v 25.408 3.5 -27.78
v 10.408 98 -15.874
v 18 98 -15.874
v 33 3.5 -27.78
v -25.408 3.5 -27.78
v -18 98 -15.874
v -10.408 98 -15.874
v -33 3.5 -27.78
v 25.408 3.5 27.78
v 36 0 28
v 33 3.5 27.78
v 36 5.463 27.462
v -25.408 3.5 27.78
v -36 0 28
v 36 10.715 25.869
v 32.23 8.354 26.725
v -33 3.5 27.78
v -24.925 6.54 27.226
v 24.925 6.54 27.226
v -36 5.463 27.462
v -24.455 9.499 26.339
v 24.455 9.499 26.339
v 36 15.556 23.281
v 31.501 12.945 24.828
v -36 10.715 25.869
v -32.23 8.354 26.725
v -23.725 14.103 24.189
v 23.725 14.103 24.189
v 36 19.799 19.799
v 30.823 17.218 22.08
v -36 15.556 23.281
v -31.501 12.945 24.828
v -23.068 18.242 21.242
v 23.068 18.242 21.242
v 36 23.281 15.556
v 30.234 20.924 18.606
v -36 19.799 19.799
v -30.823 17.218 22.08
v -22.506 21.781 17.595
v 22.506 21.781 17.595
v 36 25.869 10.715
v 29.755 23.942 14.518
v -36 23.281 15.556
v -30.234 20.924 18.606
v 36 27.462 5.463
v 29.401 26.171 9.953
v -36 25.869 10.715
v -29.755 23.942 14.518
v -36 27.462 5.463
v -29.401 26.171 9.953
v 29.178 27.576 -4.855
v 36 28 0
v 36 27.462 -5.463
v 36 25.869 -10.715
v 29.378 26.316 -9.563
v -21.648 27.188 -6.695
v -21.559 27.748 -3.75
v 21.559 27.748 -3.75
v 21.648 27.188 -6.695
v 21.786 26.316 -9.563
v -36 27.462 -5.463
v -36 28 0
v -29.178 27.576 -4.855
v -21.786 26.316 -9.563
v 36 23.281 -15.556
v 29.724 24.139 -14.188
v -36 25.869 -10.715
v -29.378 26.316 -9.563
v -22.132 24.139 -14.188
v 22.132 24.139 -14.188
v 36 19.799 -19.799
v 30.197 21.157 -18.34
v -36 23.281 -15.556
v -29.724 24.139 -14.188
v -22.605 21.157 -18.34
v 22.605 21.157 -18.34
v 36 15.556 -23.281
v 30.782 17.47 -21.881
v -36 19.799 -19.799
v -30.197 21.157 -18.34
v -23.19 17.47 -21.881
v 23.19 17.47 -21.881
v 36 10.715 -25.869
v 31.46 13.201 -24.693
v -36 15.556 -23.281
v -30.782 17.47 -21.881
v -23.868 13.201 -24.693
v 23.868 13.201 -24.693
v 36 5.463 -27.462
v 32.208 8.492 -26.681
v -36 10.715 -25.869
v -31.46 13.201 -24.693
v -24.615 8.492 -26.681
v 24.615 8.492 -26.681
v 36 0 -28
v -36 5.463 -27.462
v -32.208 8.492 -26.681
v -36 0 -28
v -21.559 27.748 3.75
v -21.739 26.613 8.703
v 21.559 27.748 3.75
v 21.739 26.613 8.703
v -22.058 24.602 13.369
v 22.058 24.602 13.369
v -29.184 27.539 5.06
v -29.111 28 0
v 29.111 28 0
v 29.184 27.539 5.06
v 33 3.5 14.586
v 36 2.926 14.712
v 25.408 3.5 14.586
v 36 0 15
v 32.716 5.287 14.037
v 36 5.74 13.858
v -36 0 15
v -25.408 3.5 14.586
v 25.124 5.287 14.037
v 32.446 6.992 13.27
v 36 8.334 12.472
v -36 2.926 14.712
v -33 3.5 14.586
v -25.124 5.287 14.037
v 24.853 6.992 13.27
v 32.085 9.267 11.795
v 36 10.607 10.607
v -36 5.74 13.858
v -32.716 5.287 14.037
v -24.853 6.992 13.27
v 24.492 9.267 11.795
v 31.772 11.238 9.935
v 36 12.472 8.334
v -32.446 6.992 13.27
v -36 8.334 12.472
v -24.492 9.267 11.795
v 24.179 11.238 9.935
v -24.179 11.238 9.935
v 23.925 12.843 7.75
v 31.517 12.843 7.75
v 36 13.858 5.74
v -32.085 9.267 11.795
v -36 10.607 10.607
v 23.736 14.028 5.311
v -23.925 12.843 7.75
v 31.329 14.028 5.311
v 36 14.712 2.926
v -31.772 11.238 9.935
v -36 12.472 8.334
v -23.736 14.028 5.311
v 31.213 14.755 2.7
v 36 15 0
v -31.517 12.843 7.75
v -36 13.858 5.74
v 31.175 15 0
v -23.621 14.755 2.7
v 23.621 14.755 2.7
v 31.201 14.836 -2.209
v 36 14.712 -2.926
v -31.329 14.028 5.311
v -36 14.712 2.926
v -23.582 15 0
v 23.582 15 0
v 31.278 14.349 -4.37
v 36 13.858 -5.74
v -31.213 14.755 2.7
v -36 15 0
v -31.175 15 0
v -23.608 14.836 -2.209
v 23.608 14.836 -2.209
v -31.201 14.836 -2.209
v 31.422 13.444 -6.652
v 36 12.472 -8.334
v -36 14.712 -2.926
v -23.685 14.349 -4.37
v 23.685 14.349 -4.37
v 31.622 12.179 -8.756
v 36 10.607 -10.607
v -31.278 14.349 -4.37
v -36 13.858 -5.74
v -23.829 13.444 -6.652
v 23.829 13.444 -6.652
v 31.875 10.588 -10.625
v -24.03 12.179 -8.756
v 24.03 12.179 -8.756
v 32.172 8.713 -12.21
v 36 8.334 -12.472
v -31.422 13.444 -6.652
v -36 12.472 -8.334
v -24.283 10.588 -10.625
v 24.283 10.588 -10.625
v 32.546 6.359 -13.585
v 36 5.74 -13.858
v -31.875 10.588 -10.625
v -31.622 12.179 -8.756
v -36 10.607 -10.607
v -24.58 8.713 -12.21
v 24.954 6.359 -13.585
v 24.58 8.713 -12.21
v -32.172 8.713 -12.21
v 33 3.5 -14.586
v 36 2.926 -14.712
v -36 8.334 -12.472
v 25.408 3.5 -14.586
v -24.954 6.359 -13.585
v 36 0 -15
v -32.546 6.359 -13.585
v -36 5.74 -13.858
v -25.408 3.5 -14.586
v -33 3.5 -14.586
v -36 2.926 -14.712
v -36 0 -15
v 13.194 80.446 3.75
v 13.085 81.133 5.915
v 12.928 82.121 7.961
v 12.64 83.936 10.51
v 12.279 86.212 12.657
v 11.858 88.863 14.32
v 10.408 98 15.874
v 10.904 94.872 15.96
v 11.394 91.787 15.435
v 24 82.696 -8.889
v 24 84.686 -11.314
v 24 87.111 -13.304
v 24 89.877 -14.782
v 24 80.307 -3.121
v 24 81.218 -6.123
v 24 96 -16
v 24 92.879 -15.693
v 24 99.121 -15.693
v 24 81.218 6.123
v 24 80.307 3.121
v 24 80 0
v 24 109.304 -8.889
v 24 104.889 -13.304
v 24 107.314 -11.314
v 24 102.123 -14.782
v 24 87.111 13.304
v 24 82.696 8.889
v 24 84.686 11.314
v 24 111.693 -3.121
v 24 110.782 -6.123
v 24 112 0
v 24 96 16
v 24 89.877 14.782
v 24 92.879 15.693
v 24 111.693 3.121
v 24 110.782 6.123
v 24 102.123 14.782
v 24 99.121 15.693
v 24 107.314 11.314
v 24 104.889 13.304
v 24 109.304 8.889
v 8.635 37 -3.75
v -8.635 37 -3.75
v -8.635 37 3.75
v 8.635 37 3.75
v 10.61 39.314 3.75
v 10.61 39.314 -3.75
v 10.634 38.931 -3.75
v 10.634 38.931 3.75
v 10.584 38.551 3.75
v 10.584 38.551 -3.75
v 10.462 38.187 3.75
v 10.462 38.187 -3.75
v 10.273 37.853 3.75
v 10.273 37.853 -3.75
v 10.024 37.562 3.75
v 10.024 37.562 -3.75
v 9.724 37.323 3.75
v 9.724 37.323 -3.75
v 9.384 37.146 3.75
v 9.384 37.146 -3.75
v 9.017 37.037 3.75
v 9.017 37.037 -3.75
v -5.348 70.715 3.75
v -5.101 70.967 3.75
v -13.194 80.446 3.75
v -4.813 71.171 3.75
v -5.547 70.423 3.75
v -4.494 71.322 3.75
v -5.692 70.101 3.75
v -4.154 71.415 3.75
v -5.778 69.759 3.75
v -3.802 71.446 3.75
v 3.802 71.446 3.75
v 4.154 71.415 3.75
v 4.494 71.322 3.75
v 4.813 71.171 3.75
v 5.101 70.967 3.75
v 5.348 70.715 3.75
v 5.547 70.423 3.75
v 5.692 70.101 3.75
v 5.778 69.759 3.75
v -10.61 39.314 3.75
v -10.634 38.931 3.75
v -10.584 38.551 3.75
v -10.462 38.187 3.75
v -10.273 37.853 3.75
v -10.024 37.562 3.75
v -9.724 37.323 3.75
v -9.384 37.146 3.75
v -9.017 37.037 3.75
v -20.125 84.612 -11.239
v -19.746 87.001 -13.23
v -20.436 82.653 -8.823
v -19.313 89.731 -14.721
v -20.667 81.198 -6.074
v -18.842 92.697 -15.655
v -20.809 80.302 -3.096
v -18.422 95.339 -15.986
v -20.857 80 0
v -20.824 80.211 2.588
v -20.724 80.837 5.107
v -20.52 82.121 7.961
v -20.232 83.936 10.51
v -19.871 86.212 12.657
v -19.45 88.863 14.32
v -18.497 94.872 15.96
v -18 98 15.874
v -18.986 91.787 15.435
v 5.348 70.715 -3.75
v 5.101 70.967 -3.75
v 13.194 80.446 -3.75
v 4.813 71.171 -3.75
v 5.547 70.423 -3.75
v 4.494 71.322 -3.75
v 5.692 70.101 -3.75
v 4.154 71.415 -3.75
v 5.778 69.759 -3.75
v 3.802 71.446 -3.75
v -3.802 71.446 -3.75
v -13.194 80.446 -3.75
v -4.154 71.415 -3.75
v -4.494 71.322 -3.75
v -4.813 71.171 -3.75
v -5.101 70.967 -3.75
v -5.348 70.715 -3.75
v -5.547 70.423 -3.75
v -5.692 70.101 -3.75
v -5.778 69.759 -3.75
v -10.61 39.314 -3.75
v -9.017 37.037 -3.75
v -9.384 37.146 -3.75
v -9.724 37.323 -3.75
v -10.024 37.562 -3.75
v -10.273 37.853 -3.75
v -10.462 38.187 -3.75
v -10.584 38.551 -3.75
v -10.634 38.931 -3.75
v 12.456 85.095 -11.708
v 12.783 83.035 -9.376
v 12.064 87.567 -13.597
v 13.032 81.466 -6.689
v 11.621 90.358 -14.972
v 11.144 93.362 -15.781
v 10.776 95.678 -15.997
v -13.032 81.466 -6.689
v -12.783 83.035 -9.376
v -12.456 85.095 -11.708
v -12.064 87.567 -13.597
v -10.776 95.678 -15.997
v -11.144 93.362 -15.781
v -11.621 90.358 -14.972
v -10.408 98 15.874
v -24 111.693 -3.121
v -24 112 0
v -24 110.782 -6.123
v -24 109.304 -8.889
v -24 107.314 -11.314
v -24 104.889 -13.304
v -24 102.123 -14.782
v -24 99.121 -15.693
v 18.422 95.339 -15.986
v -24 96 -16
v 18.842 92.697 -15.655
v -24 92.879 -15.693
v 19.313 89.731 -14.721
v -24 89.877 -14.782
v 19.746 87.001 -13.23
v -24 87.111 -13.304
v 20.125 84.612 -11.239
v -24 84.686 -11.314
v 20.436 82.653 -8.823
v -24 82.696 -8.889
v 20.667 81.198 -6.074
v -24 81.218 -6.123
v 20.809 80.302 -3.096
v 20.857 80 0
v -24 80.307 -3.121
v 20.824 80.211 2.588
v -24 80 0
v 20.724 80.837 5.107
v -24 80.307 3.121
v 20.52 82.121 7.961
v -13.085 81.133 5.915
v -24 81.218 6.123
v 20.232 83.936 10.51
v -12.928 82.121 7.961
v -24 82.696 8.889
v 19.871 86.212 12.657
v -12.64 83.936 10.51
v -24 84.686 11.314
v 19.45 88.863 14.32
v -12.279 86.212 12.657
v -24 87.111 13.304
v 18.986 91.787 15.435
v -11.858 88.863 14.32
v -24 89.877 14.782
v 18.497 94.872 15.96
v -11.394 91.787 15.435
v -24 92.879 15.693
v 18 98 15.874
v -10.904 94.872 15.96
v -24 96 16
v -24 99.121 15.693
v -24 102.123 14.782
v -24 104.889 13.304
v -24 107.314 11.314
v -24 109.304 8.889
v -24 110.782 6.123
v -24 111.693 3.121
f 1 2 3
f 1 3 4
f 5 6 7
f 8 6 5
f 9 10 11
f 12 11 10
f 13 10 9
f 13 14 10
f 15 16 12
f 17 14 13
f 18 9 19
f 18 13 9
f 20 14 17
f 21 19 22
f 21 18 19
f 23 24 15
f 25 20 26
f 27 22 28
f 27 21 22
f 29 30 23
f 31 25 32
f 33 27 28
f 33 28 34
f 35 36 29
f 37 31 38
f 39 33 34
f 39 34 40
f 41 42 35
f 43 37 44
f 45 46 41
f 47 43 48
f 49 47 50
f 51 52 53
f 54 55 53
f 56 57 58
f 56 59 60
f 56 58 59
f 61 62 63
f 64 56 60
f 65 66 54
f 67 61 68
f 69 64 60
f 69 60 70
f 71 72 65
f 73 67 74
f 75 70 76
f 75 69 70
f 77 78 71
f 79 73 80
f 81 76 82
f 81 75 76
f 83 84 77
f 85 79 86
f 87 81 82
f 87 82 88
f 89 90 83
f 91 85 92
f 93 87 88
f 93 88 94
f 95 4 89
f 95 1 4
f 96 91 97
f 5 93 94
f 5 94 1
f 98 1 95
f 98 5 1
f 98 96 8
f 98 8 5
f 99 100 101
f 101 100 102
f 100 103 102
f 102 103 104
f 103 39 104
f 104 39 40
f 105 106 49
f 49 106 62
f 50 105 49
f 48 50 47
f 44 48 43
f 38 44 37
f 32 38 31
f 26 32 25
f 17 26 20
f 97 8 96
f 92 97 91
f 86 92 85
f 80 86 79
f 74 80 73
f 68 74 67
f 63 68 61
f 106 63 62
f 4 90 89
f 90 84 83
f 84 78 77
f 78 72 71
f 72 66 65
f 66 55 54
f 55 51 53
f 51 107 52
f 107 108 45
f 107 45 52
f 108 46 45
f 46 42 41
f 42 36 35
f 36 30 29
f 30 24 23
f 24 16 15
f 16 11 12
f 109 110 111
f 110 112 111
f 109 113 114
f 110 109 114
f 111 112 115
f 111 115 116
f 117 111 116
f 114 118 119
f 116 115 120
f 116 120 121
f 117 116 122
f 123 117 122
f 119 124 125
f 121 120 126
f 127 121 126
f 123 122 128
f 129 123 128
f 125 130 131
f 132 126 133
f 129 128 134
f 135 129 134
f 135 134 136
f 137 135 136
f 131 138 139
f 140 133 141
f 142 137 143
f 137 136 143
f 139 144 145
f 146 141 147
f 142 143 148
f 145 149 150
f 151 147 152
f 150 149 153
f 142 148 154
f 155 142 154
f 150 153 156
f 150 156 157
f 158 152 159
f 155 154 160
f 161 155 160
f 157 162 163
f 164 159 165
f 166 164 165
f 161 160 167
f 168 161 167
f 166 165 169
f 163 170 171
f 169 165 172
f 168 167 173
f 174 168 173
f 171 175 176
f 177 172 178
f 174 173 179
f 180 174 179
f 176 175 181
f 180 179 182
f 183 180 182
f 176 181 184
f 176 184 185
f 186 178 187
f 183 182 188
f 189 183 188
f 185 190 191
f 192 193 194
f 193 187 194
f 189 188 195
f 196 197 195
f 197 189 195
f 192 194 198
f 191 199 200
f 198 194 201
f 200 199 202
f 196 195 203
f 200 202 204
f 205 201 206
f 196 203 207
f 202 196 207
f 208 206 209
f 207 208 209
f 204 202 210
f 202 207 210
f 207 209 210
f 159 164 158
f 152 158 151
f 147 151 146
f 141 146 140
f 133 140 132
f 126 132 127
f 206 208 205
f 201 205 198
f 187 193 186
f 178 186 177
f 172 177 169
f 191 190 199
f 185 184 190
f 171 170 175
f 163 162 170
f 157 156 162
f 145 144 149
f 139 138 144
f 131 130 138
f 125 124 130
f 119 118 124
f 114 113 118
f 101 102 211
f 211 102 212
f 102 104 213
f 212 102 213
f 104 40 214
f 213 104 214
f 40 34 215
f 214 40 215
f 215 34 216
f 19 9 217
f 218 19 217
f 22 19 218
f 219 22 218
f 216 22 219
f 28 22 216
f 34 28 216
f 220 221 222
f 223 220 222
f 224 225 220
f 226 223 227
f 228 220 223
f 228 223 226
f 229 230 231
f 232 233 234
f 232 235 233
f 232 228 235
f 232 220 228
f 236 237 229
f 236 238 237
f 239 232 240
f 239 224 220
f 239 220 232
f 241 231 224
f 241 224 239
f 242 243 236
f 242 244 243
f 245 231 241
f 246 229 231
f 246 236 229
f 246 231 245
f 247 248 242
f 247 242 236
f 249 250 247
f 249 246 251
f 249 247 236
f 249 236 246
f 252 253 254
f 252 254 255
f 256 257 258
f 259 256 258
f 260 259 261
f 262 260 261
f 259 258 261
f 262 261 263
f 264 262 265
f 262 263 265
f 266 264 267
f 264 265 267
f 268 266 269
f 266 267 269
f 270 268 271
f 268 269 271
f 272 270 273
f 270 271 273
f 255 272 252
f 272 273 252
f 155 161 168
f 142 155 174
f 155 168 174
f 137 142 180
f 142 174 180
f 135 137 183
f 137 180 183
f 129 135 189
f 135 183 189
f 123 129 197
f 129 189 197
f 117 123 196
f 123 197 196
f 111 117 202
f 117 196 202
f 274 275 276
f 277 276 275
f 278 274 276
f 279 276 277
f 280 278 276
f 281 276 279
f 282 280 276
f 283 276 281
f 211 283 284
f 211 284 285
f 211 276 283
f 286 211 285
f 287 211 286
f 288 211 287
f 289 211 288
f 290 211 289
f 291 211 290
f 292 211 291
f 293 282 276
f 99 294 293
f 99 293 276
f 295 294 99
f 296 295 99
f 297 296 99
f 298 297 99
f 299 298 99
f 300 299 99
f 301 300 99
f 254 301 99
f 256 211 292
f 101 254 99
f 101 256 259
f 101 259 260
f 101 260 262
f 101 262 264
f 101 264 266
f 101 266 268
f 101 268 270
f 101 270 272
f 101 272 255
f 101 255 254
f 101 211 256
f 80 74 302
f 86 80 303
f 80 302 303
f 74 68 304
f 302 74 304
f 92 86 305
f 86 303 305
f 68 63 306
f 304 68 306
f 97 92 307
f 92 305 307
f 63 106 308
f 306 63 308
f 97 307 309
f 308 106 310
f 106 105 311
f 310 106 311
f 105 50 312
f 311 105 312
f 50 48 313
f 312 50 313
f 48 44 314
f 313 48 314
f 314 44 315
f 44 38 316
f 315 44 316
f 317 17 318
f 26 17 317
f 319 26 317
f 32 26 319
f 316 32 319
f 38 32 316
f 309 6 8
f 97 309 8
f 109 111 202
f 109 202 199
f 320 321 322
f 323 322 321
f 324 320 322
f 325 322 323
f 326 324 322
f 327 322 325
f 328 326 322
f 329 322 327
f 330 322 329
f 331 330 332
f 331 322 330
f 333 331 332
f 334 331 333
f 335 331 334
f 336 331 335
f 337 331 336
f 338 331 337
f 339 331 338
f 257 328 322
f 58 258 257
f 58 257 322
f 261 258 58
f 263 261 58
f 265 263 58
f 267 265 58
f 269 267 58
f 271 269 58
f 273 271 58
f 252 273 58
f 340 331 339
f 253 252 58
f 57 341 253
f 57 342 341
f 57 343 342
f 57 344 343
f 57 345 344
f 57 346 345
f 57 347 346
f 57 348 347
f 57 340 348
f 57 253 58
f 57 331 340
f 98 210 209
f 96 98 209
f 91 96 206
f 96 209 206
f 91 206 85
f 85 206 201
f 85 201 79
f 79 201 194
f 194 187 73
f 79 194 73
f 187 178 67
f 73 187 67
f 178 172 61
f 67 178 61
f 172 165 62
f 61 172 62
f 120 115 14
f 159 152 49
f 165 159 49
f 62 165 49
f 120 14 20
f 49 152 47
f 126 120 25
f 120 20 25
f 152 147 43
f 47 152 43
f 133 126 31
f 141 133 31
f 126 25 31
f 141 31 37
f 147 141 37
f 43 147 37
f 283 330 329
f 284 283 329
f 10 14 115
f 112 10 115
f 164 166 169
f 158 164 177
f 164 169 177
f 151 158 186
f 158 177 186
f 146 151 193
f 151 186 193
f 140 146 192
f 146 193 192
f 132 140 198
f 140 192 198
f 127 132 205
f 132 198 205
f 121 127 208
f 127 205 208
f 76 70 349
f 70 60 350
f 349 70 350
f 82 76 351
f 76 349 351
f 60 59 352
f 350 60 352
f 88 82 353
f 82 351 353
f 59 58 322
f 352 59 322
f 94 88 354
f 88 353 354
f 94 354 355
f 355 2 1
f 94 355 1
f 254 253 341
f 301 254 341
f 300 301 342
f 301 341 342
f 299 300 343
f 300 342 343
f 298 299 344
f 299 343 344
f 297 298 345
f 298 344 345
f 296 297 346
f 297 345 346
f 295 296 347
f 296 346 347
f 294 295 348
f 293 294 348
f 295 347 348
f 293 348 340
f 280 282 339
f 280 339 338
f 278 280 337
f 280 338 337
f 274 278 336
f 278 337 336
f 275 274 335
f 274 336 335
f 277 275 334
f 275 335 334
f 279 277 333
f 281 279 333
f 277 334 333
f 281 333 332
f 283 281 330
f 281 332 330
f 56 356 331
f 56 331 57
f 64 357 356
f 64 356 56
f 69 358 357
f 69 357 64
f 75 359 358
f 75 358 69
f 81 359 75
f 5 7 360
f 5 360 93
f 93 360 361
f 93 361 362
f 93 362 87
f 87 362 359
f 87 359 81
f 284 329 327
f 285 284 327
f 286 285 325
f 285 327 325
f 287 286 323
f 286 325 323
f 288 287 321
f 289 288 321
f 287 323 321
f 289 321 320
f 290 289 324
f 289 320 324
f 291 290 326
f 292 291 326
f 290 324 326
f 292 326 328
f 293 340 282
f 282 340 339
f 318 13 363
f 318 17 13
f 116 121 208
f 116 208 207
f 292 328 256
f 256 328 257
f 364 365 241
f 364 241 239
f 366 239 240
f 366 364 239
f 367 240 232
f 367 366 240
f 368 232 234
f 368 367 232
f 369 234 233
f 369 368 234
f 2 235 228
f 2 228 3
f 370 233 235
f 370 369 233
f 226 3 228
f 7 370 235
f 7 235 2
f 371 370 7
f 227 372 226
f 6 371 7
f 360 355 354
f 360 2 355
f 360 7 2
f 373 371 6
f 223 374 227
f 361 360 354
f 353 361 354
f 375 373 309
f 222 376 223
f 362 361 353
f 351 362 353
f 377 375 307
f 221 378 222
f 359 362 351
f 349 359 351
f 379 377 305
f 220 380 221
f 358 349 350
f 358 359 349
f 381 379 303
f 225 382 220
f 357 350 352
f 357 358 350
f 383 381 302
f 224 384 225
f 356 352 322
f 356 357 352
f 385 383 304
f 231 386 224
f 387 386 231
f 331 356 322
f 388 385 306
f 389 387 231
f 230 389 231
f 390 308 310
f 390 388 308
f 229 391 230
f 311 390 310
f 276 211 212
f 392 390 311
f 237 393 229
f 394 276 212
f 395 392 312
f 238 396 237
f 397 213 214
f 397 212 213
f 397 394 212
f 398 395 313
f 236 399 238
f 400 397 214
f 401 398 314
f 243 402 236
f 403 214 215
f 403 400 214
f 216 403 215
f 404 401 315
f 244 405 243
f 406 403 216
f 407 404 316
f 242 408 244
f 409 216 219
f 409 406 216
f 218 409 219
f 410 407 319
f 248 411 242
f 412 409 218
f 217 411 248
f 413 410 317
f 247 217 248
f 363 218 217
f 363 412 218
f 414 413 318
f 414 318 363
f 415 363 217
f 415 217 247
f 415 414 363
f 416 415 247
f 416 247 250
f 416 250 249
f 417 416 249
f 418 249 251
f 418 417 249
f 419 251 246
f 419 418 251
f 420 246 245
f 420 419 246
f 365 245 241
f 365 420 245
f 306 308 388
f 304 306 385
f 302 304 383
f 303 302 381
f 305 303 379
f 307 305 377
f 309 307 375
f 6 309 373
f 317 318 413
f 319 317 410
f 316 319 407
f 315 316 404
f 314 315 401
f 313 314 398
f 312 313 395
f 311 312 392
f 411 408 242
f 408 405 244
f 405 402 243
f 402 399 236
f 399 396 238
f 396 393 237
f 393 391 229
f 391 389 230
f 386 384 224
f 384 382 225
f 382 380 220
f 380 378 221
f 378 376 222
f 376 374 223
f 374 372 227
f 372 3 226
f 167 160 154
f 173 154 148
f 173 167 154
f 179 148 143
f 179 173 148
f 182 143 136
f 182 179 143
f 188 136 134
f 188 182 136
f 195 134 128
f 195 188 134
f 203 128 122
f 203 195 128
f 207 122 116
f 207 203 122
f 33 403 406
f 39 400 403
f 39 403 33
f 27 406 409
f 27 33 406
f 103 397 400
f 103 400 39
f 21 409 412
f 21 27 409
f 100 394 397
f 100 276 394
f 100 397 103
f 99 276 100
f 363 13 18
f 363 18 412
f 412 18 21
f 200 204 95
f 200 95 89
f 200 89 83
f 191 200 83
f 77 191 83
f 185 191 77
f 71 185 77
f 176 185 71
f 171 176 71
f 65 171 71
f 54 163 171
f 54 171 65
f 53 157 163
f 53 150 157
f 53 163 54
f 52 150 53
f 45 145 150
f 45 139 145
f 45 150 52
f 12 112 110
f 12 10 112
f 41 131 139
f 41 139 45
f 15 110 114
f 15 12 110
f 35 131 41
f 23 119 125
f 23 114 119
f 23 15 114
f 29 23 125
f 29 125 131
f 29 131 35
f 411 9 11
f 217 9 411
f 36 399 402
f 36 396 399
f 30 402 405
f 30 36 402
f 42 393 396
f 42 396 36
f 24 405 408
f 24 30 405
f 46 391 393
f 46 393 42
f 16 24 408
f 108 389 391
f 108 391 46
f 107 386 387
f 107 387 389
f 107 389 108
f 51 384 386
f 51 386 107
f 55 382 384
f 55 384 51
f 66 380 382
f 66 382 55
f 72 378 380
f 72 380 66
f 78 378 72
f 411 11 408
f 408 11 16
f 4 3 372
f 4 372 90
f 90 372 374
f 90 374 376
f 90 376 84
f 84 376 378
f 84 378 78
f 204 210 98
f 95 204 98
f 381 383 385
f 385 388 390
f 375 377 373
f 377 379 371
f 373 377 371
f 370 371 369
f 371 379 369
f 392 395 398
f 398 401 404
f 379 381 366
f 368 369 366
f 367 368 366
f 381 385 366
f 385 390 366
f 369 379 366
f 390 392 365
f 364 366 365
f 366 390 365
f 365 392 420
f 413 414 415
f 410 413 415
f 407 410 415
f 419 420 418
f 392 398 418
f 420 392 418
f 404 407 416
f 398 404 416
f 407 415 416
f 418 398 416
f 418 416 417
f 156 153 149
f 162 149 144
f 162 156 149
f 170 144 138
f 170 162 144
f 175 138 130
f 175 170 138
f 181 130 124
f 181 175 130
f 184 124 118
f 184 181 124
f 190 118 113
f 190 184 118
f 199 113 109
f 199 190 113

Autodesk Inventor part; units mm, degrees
ref_plane "YZ Plane" through (0, 0, 0) normal (1, 0, 0) x (0, 1, 0)
ref_plane "XZ Plane" through (0, 0, 0) normal (0, 1, 0) x (-1, 0, 0)
sketch "Schizzo1" plane through (0, 0, 0) normal (1, 0, 0) x (0, 1, 0)
  circle A0 centre (96, 0) radius 10
  circle A1 centre (96, 0) radius 16
  arc A2 (0, -15) -> (0, 15) centre (0, 0) ccw
  arc A3 (0, -28) -> (0, 28) centre (0, 0) ccw
  line L0 (0, 28) -> (0, 15)
  line L1 (0, -15) -> (0, -28)
  line L2 (0, -8.9606) -> (0, 0)
  line L3 (0, 0) -> (192, 0)
  line L4 (3.5, 27.7804) -> (98, 15.8745)
  line L5 (98, -15.8745) -> (3.5, -27.7804)
  line L6 (0, 15) -> (0, -15)
  point P0 (9.0471, 0)
  point P1 (0, -4.4803)
  dimension "d0" = 20
  dimension "d1" = 15
  dimension "d2" = 96
  dimension "d3" = 28
  dimension "d4" = 32
extrude "Estrusione1" add sketch "Schizzo1" along normal mid plane 48 contours L3 A0 | L3 A1 A0 | A0 L3 A1 | A0 L3
extrude "Estrusione2" add sketch "Schizzo1" along normal mid plane 72 contours L3 A2 L0 A3 | A3 L1 A2 L3
sketch "Schizzo3" plane through (0, 0, 0) normal (1, 0, 0) x (0, 1, 0)
  line L0 (98, 15.8745) -> (3.5, 27.7804)
  circle A0 centre (96, 0) radius 16 projected
  arc A1 (0, -28) -> (0, 28) centre (0, 0) ccw projected
ref_plane "Piano di lavoro2" through (0, 98, 15.8745) normal (0, 0.125, 0.9921567) x (-1, 0, 0)
sketch "Schizzo4" plane through (0, 98, 15.8745) normal (0, 0.125, 0.9921567) x (-1, 0, 0)
  line L0 (24, -16) -> (24, 16) projected
  line L1 (-24, 16) -> (-24, -16) projected
  line L2 (36, 67.247) -> (36, 98.747) projected
  line L3 (-36, 98.747) -> (-36, 67.247) projected
  line L4 (0, 95.247) -> (0, 93.372) construction
  line L5 (-18, 0) -> (-33, 95.247)
  line L6 (-10.4076, 0) -> (-25.4076, 95.247)
  line L7 (18, 0) -> (33, 95.247)
  line L8 (10.4076, 0) -> (25.4076, 95.247)
  line L9 (0, 0) -> (0, 95.247) projected
  line L10 (18, 0) -> (10.4076, 0)
  line L11 (-10.4076, 0) -> (-18, 0)
  line L12 (-25.4076, 95.247) -> (-33, 95.247)
  line L13 (36, 93.372) -> (-36, 93.372) projected
  line L14 (33, 95.247) -> (25.4076, 95.247)
  line L15 (36, 97.122) -> (-36, 97.122) projected
  point P0 (36, 91.747)
  point P1 (-36, 91.747)
  dimension "d10" = 7.5
  dimension "d11" = 36
  dimension "d12" = 66
sketch "Schizzo6" plane through (0, 0, 0) normal (0, 0, 1) x (1, 0, 0)
  line L0 (-18, 98) -> (-33, 3.5) projected
  line L1 (-10.4076, 98) -> (-25.4076, 3.5) projected
  line L2 (10.4076, 98) -> (25.4076, 3.5) projected
  line L3 (18, 98) -> (33, 3.5) projected
  line L4 (-36, 0) -> (36, 0) projected
  line L5 (36, 0) -> (36, 0) projected
  line L6 (36, 0) -> (-36, 0) projected
  line L7 (-36, 0) -> (-36, 0) projected
  line L8 (-33, 3.5) -> (-25.4076, 3.5) projected
  line L9 (25.4076, 3.5) -> (33, 3.5) projected
  line L10 (-18, 98) -> (-10.4076, 98) projected
  line L11 (10.4076, 98) -> (18, 98) projected
  point P0 (0, 0)
extrude "Estrusione4" add sketch "Schizzo6" along normal up to surface surface through (0, 98, 15.8745) normal (0, 0.125, 0.9921567)
mirror "Specchio1" about plane through (0, 0, 0) normal (0, 0, 1) of "Estrusione4"
sketch "Schizzo8" plane through (0, 0, 0) normal (1, 0, 0) x (0, 1, 0)
  circle A0 centre (96, 0) radius 16 projected
  arc A1 (0, -28) -> (0, 28) centre (0, 0) ccw projected
  line L0 (80.4457, 3.75) -> (27.7477, 3.75)
  line L1 (80.4457, -3.75) -> (27.7477, -3.75)
  line L2 (-22.7749, 0) -> (136.6494, 0) construction
  dimension "d17" = 7.5
extrude "Estrusione5" add sketch "Schizzo8" along normal up to surface contours A0 L1 A1 L0 surface through (10.4076, 98, 0) normal (-0.9876355, -0.1567675, 0)
extrude "Estrusione6" add sketch "Schizzo8" against normal up to surface contours A0 L1 A1 L0 surface through (-25.4076, 3.5, 0) normal (0.9876355, -0.1567675, 0)
sketch "Schizzo9" plane through (0, 0, 0) normal (0, 0, 1) x (1, 0, 0)
  line L0 (-50.4, 0) -> (50.4, 0) projected
  line L1 (0, -22.7749) -> (0, 136.6494) projected
  line L2 (-36, 28) -> (36, 28) projected
  line L3 (-13.194, 80.4457) -> (-21.5587, 27.7477) projected
  line L4 (21.5587, 27.7477) -> (13.194, 80.4457) projected
  line L5 (13.194, 80.4457) -> (-13.194, 80.4457) projected
  line L6 (-8.6349, 37) -> (8.6349, 37)
  line L7 (-10.6102, 39.3135) -> (-5.7776, 69.7592)
  line L8 (-3.8023, 71.4457) -> (3.8023, 71.4457)
  line L9 (5.7776, 69.7592) -> (10.6102, 39.3135)
  arc A0 (-3.8023, 71.4457) -> (-5.7776, 69.7592) centre (-3.8023, 69.4457) ccw
  arc A1 (5.7776, 69.7592) -> (3.8023, 71.4457) centre (3.8023, 69.4457) ccw
  arc A2 (-10.6102, 39.3135) -> (-8.6349, 37) centre (-8.6349, 39) ccw
  arc A3 (8.6349, 37) -> (10.6102, 39.3135) centre (8.6349, 39) ccw
  point P0 (0, 0)
  dimension "d22" = 9
  dimension "d23" = 9
  dimension "d24" = 2
extrude "Estrusione7" cut sketch "Schizzo9" along normal through all both and the other way through all contours L6 A2 L7 A0 L8 L1 | L1 L8 A1 L9 A3 L6
properties part number "05-15-2023 esercizi_piani parallaleli"
